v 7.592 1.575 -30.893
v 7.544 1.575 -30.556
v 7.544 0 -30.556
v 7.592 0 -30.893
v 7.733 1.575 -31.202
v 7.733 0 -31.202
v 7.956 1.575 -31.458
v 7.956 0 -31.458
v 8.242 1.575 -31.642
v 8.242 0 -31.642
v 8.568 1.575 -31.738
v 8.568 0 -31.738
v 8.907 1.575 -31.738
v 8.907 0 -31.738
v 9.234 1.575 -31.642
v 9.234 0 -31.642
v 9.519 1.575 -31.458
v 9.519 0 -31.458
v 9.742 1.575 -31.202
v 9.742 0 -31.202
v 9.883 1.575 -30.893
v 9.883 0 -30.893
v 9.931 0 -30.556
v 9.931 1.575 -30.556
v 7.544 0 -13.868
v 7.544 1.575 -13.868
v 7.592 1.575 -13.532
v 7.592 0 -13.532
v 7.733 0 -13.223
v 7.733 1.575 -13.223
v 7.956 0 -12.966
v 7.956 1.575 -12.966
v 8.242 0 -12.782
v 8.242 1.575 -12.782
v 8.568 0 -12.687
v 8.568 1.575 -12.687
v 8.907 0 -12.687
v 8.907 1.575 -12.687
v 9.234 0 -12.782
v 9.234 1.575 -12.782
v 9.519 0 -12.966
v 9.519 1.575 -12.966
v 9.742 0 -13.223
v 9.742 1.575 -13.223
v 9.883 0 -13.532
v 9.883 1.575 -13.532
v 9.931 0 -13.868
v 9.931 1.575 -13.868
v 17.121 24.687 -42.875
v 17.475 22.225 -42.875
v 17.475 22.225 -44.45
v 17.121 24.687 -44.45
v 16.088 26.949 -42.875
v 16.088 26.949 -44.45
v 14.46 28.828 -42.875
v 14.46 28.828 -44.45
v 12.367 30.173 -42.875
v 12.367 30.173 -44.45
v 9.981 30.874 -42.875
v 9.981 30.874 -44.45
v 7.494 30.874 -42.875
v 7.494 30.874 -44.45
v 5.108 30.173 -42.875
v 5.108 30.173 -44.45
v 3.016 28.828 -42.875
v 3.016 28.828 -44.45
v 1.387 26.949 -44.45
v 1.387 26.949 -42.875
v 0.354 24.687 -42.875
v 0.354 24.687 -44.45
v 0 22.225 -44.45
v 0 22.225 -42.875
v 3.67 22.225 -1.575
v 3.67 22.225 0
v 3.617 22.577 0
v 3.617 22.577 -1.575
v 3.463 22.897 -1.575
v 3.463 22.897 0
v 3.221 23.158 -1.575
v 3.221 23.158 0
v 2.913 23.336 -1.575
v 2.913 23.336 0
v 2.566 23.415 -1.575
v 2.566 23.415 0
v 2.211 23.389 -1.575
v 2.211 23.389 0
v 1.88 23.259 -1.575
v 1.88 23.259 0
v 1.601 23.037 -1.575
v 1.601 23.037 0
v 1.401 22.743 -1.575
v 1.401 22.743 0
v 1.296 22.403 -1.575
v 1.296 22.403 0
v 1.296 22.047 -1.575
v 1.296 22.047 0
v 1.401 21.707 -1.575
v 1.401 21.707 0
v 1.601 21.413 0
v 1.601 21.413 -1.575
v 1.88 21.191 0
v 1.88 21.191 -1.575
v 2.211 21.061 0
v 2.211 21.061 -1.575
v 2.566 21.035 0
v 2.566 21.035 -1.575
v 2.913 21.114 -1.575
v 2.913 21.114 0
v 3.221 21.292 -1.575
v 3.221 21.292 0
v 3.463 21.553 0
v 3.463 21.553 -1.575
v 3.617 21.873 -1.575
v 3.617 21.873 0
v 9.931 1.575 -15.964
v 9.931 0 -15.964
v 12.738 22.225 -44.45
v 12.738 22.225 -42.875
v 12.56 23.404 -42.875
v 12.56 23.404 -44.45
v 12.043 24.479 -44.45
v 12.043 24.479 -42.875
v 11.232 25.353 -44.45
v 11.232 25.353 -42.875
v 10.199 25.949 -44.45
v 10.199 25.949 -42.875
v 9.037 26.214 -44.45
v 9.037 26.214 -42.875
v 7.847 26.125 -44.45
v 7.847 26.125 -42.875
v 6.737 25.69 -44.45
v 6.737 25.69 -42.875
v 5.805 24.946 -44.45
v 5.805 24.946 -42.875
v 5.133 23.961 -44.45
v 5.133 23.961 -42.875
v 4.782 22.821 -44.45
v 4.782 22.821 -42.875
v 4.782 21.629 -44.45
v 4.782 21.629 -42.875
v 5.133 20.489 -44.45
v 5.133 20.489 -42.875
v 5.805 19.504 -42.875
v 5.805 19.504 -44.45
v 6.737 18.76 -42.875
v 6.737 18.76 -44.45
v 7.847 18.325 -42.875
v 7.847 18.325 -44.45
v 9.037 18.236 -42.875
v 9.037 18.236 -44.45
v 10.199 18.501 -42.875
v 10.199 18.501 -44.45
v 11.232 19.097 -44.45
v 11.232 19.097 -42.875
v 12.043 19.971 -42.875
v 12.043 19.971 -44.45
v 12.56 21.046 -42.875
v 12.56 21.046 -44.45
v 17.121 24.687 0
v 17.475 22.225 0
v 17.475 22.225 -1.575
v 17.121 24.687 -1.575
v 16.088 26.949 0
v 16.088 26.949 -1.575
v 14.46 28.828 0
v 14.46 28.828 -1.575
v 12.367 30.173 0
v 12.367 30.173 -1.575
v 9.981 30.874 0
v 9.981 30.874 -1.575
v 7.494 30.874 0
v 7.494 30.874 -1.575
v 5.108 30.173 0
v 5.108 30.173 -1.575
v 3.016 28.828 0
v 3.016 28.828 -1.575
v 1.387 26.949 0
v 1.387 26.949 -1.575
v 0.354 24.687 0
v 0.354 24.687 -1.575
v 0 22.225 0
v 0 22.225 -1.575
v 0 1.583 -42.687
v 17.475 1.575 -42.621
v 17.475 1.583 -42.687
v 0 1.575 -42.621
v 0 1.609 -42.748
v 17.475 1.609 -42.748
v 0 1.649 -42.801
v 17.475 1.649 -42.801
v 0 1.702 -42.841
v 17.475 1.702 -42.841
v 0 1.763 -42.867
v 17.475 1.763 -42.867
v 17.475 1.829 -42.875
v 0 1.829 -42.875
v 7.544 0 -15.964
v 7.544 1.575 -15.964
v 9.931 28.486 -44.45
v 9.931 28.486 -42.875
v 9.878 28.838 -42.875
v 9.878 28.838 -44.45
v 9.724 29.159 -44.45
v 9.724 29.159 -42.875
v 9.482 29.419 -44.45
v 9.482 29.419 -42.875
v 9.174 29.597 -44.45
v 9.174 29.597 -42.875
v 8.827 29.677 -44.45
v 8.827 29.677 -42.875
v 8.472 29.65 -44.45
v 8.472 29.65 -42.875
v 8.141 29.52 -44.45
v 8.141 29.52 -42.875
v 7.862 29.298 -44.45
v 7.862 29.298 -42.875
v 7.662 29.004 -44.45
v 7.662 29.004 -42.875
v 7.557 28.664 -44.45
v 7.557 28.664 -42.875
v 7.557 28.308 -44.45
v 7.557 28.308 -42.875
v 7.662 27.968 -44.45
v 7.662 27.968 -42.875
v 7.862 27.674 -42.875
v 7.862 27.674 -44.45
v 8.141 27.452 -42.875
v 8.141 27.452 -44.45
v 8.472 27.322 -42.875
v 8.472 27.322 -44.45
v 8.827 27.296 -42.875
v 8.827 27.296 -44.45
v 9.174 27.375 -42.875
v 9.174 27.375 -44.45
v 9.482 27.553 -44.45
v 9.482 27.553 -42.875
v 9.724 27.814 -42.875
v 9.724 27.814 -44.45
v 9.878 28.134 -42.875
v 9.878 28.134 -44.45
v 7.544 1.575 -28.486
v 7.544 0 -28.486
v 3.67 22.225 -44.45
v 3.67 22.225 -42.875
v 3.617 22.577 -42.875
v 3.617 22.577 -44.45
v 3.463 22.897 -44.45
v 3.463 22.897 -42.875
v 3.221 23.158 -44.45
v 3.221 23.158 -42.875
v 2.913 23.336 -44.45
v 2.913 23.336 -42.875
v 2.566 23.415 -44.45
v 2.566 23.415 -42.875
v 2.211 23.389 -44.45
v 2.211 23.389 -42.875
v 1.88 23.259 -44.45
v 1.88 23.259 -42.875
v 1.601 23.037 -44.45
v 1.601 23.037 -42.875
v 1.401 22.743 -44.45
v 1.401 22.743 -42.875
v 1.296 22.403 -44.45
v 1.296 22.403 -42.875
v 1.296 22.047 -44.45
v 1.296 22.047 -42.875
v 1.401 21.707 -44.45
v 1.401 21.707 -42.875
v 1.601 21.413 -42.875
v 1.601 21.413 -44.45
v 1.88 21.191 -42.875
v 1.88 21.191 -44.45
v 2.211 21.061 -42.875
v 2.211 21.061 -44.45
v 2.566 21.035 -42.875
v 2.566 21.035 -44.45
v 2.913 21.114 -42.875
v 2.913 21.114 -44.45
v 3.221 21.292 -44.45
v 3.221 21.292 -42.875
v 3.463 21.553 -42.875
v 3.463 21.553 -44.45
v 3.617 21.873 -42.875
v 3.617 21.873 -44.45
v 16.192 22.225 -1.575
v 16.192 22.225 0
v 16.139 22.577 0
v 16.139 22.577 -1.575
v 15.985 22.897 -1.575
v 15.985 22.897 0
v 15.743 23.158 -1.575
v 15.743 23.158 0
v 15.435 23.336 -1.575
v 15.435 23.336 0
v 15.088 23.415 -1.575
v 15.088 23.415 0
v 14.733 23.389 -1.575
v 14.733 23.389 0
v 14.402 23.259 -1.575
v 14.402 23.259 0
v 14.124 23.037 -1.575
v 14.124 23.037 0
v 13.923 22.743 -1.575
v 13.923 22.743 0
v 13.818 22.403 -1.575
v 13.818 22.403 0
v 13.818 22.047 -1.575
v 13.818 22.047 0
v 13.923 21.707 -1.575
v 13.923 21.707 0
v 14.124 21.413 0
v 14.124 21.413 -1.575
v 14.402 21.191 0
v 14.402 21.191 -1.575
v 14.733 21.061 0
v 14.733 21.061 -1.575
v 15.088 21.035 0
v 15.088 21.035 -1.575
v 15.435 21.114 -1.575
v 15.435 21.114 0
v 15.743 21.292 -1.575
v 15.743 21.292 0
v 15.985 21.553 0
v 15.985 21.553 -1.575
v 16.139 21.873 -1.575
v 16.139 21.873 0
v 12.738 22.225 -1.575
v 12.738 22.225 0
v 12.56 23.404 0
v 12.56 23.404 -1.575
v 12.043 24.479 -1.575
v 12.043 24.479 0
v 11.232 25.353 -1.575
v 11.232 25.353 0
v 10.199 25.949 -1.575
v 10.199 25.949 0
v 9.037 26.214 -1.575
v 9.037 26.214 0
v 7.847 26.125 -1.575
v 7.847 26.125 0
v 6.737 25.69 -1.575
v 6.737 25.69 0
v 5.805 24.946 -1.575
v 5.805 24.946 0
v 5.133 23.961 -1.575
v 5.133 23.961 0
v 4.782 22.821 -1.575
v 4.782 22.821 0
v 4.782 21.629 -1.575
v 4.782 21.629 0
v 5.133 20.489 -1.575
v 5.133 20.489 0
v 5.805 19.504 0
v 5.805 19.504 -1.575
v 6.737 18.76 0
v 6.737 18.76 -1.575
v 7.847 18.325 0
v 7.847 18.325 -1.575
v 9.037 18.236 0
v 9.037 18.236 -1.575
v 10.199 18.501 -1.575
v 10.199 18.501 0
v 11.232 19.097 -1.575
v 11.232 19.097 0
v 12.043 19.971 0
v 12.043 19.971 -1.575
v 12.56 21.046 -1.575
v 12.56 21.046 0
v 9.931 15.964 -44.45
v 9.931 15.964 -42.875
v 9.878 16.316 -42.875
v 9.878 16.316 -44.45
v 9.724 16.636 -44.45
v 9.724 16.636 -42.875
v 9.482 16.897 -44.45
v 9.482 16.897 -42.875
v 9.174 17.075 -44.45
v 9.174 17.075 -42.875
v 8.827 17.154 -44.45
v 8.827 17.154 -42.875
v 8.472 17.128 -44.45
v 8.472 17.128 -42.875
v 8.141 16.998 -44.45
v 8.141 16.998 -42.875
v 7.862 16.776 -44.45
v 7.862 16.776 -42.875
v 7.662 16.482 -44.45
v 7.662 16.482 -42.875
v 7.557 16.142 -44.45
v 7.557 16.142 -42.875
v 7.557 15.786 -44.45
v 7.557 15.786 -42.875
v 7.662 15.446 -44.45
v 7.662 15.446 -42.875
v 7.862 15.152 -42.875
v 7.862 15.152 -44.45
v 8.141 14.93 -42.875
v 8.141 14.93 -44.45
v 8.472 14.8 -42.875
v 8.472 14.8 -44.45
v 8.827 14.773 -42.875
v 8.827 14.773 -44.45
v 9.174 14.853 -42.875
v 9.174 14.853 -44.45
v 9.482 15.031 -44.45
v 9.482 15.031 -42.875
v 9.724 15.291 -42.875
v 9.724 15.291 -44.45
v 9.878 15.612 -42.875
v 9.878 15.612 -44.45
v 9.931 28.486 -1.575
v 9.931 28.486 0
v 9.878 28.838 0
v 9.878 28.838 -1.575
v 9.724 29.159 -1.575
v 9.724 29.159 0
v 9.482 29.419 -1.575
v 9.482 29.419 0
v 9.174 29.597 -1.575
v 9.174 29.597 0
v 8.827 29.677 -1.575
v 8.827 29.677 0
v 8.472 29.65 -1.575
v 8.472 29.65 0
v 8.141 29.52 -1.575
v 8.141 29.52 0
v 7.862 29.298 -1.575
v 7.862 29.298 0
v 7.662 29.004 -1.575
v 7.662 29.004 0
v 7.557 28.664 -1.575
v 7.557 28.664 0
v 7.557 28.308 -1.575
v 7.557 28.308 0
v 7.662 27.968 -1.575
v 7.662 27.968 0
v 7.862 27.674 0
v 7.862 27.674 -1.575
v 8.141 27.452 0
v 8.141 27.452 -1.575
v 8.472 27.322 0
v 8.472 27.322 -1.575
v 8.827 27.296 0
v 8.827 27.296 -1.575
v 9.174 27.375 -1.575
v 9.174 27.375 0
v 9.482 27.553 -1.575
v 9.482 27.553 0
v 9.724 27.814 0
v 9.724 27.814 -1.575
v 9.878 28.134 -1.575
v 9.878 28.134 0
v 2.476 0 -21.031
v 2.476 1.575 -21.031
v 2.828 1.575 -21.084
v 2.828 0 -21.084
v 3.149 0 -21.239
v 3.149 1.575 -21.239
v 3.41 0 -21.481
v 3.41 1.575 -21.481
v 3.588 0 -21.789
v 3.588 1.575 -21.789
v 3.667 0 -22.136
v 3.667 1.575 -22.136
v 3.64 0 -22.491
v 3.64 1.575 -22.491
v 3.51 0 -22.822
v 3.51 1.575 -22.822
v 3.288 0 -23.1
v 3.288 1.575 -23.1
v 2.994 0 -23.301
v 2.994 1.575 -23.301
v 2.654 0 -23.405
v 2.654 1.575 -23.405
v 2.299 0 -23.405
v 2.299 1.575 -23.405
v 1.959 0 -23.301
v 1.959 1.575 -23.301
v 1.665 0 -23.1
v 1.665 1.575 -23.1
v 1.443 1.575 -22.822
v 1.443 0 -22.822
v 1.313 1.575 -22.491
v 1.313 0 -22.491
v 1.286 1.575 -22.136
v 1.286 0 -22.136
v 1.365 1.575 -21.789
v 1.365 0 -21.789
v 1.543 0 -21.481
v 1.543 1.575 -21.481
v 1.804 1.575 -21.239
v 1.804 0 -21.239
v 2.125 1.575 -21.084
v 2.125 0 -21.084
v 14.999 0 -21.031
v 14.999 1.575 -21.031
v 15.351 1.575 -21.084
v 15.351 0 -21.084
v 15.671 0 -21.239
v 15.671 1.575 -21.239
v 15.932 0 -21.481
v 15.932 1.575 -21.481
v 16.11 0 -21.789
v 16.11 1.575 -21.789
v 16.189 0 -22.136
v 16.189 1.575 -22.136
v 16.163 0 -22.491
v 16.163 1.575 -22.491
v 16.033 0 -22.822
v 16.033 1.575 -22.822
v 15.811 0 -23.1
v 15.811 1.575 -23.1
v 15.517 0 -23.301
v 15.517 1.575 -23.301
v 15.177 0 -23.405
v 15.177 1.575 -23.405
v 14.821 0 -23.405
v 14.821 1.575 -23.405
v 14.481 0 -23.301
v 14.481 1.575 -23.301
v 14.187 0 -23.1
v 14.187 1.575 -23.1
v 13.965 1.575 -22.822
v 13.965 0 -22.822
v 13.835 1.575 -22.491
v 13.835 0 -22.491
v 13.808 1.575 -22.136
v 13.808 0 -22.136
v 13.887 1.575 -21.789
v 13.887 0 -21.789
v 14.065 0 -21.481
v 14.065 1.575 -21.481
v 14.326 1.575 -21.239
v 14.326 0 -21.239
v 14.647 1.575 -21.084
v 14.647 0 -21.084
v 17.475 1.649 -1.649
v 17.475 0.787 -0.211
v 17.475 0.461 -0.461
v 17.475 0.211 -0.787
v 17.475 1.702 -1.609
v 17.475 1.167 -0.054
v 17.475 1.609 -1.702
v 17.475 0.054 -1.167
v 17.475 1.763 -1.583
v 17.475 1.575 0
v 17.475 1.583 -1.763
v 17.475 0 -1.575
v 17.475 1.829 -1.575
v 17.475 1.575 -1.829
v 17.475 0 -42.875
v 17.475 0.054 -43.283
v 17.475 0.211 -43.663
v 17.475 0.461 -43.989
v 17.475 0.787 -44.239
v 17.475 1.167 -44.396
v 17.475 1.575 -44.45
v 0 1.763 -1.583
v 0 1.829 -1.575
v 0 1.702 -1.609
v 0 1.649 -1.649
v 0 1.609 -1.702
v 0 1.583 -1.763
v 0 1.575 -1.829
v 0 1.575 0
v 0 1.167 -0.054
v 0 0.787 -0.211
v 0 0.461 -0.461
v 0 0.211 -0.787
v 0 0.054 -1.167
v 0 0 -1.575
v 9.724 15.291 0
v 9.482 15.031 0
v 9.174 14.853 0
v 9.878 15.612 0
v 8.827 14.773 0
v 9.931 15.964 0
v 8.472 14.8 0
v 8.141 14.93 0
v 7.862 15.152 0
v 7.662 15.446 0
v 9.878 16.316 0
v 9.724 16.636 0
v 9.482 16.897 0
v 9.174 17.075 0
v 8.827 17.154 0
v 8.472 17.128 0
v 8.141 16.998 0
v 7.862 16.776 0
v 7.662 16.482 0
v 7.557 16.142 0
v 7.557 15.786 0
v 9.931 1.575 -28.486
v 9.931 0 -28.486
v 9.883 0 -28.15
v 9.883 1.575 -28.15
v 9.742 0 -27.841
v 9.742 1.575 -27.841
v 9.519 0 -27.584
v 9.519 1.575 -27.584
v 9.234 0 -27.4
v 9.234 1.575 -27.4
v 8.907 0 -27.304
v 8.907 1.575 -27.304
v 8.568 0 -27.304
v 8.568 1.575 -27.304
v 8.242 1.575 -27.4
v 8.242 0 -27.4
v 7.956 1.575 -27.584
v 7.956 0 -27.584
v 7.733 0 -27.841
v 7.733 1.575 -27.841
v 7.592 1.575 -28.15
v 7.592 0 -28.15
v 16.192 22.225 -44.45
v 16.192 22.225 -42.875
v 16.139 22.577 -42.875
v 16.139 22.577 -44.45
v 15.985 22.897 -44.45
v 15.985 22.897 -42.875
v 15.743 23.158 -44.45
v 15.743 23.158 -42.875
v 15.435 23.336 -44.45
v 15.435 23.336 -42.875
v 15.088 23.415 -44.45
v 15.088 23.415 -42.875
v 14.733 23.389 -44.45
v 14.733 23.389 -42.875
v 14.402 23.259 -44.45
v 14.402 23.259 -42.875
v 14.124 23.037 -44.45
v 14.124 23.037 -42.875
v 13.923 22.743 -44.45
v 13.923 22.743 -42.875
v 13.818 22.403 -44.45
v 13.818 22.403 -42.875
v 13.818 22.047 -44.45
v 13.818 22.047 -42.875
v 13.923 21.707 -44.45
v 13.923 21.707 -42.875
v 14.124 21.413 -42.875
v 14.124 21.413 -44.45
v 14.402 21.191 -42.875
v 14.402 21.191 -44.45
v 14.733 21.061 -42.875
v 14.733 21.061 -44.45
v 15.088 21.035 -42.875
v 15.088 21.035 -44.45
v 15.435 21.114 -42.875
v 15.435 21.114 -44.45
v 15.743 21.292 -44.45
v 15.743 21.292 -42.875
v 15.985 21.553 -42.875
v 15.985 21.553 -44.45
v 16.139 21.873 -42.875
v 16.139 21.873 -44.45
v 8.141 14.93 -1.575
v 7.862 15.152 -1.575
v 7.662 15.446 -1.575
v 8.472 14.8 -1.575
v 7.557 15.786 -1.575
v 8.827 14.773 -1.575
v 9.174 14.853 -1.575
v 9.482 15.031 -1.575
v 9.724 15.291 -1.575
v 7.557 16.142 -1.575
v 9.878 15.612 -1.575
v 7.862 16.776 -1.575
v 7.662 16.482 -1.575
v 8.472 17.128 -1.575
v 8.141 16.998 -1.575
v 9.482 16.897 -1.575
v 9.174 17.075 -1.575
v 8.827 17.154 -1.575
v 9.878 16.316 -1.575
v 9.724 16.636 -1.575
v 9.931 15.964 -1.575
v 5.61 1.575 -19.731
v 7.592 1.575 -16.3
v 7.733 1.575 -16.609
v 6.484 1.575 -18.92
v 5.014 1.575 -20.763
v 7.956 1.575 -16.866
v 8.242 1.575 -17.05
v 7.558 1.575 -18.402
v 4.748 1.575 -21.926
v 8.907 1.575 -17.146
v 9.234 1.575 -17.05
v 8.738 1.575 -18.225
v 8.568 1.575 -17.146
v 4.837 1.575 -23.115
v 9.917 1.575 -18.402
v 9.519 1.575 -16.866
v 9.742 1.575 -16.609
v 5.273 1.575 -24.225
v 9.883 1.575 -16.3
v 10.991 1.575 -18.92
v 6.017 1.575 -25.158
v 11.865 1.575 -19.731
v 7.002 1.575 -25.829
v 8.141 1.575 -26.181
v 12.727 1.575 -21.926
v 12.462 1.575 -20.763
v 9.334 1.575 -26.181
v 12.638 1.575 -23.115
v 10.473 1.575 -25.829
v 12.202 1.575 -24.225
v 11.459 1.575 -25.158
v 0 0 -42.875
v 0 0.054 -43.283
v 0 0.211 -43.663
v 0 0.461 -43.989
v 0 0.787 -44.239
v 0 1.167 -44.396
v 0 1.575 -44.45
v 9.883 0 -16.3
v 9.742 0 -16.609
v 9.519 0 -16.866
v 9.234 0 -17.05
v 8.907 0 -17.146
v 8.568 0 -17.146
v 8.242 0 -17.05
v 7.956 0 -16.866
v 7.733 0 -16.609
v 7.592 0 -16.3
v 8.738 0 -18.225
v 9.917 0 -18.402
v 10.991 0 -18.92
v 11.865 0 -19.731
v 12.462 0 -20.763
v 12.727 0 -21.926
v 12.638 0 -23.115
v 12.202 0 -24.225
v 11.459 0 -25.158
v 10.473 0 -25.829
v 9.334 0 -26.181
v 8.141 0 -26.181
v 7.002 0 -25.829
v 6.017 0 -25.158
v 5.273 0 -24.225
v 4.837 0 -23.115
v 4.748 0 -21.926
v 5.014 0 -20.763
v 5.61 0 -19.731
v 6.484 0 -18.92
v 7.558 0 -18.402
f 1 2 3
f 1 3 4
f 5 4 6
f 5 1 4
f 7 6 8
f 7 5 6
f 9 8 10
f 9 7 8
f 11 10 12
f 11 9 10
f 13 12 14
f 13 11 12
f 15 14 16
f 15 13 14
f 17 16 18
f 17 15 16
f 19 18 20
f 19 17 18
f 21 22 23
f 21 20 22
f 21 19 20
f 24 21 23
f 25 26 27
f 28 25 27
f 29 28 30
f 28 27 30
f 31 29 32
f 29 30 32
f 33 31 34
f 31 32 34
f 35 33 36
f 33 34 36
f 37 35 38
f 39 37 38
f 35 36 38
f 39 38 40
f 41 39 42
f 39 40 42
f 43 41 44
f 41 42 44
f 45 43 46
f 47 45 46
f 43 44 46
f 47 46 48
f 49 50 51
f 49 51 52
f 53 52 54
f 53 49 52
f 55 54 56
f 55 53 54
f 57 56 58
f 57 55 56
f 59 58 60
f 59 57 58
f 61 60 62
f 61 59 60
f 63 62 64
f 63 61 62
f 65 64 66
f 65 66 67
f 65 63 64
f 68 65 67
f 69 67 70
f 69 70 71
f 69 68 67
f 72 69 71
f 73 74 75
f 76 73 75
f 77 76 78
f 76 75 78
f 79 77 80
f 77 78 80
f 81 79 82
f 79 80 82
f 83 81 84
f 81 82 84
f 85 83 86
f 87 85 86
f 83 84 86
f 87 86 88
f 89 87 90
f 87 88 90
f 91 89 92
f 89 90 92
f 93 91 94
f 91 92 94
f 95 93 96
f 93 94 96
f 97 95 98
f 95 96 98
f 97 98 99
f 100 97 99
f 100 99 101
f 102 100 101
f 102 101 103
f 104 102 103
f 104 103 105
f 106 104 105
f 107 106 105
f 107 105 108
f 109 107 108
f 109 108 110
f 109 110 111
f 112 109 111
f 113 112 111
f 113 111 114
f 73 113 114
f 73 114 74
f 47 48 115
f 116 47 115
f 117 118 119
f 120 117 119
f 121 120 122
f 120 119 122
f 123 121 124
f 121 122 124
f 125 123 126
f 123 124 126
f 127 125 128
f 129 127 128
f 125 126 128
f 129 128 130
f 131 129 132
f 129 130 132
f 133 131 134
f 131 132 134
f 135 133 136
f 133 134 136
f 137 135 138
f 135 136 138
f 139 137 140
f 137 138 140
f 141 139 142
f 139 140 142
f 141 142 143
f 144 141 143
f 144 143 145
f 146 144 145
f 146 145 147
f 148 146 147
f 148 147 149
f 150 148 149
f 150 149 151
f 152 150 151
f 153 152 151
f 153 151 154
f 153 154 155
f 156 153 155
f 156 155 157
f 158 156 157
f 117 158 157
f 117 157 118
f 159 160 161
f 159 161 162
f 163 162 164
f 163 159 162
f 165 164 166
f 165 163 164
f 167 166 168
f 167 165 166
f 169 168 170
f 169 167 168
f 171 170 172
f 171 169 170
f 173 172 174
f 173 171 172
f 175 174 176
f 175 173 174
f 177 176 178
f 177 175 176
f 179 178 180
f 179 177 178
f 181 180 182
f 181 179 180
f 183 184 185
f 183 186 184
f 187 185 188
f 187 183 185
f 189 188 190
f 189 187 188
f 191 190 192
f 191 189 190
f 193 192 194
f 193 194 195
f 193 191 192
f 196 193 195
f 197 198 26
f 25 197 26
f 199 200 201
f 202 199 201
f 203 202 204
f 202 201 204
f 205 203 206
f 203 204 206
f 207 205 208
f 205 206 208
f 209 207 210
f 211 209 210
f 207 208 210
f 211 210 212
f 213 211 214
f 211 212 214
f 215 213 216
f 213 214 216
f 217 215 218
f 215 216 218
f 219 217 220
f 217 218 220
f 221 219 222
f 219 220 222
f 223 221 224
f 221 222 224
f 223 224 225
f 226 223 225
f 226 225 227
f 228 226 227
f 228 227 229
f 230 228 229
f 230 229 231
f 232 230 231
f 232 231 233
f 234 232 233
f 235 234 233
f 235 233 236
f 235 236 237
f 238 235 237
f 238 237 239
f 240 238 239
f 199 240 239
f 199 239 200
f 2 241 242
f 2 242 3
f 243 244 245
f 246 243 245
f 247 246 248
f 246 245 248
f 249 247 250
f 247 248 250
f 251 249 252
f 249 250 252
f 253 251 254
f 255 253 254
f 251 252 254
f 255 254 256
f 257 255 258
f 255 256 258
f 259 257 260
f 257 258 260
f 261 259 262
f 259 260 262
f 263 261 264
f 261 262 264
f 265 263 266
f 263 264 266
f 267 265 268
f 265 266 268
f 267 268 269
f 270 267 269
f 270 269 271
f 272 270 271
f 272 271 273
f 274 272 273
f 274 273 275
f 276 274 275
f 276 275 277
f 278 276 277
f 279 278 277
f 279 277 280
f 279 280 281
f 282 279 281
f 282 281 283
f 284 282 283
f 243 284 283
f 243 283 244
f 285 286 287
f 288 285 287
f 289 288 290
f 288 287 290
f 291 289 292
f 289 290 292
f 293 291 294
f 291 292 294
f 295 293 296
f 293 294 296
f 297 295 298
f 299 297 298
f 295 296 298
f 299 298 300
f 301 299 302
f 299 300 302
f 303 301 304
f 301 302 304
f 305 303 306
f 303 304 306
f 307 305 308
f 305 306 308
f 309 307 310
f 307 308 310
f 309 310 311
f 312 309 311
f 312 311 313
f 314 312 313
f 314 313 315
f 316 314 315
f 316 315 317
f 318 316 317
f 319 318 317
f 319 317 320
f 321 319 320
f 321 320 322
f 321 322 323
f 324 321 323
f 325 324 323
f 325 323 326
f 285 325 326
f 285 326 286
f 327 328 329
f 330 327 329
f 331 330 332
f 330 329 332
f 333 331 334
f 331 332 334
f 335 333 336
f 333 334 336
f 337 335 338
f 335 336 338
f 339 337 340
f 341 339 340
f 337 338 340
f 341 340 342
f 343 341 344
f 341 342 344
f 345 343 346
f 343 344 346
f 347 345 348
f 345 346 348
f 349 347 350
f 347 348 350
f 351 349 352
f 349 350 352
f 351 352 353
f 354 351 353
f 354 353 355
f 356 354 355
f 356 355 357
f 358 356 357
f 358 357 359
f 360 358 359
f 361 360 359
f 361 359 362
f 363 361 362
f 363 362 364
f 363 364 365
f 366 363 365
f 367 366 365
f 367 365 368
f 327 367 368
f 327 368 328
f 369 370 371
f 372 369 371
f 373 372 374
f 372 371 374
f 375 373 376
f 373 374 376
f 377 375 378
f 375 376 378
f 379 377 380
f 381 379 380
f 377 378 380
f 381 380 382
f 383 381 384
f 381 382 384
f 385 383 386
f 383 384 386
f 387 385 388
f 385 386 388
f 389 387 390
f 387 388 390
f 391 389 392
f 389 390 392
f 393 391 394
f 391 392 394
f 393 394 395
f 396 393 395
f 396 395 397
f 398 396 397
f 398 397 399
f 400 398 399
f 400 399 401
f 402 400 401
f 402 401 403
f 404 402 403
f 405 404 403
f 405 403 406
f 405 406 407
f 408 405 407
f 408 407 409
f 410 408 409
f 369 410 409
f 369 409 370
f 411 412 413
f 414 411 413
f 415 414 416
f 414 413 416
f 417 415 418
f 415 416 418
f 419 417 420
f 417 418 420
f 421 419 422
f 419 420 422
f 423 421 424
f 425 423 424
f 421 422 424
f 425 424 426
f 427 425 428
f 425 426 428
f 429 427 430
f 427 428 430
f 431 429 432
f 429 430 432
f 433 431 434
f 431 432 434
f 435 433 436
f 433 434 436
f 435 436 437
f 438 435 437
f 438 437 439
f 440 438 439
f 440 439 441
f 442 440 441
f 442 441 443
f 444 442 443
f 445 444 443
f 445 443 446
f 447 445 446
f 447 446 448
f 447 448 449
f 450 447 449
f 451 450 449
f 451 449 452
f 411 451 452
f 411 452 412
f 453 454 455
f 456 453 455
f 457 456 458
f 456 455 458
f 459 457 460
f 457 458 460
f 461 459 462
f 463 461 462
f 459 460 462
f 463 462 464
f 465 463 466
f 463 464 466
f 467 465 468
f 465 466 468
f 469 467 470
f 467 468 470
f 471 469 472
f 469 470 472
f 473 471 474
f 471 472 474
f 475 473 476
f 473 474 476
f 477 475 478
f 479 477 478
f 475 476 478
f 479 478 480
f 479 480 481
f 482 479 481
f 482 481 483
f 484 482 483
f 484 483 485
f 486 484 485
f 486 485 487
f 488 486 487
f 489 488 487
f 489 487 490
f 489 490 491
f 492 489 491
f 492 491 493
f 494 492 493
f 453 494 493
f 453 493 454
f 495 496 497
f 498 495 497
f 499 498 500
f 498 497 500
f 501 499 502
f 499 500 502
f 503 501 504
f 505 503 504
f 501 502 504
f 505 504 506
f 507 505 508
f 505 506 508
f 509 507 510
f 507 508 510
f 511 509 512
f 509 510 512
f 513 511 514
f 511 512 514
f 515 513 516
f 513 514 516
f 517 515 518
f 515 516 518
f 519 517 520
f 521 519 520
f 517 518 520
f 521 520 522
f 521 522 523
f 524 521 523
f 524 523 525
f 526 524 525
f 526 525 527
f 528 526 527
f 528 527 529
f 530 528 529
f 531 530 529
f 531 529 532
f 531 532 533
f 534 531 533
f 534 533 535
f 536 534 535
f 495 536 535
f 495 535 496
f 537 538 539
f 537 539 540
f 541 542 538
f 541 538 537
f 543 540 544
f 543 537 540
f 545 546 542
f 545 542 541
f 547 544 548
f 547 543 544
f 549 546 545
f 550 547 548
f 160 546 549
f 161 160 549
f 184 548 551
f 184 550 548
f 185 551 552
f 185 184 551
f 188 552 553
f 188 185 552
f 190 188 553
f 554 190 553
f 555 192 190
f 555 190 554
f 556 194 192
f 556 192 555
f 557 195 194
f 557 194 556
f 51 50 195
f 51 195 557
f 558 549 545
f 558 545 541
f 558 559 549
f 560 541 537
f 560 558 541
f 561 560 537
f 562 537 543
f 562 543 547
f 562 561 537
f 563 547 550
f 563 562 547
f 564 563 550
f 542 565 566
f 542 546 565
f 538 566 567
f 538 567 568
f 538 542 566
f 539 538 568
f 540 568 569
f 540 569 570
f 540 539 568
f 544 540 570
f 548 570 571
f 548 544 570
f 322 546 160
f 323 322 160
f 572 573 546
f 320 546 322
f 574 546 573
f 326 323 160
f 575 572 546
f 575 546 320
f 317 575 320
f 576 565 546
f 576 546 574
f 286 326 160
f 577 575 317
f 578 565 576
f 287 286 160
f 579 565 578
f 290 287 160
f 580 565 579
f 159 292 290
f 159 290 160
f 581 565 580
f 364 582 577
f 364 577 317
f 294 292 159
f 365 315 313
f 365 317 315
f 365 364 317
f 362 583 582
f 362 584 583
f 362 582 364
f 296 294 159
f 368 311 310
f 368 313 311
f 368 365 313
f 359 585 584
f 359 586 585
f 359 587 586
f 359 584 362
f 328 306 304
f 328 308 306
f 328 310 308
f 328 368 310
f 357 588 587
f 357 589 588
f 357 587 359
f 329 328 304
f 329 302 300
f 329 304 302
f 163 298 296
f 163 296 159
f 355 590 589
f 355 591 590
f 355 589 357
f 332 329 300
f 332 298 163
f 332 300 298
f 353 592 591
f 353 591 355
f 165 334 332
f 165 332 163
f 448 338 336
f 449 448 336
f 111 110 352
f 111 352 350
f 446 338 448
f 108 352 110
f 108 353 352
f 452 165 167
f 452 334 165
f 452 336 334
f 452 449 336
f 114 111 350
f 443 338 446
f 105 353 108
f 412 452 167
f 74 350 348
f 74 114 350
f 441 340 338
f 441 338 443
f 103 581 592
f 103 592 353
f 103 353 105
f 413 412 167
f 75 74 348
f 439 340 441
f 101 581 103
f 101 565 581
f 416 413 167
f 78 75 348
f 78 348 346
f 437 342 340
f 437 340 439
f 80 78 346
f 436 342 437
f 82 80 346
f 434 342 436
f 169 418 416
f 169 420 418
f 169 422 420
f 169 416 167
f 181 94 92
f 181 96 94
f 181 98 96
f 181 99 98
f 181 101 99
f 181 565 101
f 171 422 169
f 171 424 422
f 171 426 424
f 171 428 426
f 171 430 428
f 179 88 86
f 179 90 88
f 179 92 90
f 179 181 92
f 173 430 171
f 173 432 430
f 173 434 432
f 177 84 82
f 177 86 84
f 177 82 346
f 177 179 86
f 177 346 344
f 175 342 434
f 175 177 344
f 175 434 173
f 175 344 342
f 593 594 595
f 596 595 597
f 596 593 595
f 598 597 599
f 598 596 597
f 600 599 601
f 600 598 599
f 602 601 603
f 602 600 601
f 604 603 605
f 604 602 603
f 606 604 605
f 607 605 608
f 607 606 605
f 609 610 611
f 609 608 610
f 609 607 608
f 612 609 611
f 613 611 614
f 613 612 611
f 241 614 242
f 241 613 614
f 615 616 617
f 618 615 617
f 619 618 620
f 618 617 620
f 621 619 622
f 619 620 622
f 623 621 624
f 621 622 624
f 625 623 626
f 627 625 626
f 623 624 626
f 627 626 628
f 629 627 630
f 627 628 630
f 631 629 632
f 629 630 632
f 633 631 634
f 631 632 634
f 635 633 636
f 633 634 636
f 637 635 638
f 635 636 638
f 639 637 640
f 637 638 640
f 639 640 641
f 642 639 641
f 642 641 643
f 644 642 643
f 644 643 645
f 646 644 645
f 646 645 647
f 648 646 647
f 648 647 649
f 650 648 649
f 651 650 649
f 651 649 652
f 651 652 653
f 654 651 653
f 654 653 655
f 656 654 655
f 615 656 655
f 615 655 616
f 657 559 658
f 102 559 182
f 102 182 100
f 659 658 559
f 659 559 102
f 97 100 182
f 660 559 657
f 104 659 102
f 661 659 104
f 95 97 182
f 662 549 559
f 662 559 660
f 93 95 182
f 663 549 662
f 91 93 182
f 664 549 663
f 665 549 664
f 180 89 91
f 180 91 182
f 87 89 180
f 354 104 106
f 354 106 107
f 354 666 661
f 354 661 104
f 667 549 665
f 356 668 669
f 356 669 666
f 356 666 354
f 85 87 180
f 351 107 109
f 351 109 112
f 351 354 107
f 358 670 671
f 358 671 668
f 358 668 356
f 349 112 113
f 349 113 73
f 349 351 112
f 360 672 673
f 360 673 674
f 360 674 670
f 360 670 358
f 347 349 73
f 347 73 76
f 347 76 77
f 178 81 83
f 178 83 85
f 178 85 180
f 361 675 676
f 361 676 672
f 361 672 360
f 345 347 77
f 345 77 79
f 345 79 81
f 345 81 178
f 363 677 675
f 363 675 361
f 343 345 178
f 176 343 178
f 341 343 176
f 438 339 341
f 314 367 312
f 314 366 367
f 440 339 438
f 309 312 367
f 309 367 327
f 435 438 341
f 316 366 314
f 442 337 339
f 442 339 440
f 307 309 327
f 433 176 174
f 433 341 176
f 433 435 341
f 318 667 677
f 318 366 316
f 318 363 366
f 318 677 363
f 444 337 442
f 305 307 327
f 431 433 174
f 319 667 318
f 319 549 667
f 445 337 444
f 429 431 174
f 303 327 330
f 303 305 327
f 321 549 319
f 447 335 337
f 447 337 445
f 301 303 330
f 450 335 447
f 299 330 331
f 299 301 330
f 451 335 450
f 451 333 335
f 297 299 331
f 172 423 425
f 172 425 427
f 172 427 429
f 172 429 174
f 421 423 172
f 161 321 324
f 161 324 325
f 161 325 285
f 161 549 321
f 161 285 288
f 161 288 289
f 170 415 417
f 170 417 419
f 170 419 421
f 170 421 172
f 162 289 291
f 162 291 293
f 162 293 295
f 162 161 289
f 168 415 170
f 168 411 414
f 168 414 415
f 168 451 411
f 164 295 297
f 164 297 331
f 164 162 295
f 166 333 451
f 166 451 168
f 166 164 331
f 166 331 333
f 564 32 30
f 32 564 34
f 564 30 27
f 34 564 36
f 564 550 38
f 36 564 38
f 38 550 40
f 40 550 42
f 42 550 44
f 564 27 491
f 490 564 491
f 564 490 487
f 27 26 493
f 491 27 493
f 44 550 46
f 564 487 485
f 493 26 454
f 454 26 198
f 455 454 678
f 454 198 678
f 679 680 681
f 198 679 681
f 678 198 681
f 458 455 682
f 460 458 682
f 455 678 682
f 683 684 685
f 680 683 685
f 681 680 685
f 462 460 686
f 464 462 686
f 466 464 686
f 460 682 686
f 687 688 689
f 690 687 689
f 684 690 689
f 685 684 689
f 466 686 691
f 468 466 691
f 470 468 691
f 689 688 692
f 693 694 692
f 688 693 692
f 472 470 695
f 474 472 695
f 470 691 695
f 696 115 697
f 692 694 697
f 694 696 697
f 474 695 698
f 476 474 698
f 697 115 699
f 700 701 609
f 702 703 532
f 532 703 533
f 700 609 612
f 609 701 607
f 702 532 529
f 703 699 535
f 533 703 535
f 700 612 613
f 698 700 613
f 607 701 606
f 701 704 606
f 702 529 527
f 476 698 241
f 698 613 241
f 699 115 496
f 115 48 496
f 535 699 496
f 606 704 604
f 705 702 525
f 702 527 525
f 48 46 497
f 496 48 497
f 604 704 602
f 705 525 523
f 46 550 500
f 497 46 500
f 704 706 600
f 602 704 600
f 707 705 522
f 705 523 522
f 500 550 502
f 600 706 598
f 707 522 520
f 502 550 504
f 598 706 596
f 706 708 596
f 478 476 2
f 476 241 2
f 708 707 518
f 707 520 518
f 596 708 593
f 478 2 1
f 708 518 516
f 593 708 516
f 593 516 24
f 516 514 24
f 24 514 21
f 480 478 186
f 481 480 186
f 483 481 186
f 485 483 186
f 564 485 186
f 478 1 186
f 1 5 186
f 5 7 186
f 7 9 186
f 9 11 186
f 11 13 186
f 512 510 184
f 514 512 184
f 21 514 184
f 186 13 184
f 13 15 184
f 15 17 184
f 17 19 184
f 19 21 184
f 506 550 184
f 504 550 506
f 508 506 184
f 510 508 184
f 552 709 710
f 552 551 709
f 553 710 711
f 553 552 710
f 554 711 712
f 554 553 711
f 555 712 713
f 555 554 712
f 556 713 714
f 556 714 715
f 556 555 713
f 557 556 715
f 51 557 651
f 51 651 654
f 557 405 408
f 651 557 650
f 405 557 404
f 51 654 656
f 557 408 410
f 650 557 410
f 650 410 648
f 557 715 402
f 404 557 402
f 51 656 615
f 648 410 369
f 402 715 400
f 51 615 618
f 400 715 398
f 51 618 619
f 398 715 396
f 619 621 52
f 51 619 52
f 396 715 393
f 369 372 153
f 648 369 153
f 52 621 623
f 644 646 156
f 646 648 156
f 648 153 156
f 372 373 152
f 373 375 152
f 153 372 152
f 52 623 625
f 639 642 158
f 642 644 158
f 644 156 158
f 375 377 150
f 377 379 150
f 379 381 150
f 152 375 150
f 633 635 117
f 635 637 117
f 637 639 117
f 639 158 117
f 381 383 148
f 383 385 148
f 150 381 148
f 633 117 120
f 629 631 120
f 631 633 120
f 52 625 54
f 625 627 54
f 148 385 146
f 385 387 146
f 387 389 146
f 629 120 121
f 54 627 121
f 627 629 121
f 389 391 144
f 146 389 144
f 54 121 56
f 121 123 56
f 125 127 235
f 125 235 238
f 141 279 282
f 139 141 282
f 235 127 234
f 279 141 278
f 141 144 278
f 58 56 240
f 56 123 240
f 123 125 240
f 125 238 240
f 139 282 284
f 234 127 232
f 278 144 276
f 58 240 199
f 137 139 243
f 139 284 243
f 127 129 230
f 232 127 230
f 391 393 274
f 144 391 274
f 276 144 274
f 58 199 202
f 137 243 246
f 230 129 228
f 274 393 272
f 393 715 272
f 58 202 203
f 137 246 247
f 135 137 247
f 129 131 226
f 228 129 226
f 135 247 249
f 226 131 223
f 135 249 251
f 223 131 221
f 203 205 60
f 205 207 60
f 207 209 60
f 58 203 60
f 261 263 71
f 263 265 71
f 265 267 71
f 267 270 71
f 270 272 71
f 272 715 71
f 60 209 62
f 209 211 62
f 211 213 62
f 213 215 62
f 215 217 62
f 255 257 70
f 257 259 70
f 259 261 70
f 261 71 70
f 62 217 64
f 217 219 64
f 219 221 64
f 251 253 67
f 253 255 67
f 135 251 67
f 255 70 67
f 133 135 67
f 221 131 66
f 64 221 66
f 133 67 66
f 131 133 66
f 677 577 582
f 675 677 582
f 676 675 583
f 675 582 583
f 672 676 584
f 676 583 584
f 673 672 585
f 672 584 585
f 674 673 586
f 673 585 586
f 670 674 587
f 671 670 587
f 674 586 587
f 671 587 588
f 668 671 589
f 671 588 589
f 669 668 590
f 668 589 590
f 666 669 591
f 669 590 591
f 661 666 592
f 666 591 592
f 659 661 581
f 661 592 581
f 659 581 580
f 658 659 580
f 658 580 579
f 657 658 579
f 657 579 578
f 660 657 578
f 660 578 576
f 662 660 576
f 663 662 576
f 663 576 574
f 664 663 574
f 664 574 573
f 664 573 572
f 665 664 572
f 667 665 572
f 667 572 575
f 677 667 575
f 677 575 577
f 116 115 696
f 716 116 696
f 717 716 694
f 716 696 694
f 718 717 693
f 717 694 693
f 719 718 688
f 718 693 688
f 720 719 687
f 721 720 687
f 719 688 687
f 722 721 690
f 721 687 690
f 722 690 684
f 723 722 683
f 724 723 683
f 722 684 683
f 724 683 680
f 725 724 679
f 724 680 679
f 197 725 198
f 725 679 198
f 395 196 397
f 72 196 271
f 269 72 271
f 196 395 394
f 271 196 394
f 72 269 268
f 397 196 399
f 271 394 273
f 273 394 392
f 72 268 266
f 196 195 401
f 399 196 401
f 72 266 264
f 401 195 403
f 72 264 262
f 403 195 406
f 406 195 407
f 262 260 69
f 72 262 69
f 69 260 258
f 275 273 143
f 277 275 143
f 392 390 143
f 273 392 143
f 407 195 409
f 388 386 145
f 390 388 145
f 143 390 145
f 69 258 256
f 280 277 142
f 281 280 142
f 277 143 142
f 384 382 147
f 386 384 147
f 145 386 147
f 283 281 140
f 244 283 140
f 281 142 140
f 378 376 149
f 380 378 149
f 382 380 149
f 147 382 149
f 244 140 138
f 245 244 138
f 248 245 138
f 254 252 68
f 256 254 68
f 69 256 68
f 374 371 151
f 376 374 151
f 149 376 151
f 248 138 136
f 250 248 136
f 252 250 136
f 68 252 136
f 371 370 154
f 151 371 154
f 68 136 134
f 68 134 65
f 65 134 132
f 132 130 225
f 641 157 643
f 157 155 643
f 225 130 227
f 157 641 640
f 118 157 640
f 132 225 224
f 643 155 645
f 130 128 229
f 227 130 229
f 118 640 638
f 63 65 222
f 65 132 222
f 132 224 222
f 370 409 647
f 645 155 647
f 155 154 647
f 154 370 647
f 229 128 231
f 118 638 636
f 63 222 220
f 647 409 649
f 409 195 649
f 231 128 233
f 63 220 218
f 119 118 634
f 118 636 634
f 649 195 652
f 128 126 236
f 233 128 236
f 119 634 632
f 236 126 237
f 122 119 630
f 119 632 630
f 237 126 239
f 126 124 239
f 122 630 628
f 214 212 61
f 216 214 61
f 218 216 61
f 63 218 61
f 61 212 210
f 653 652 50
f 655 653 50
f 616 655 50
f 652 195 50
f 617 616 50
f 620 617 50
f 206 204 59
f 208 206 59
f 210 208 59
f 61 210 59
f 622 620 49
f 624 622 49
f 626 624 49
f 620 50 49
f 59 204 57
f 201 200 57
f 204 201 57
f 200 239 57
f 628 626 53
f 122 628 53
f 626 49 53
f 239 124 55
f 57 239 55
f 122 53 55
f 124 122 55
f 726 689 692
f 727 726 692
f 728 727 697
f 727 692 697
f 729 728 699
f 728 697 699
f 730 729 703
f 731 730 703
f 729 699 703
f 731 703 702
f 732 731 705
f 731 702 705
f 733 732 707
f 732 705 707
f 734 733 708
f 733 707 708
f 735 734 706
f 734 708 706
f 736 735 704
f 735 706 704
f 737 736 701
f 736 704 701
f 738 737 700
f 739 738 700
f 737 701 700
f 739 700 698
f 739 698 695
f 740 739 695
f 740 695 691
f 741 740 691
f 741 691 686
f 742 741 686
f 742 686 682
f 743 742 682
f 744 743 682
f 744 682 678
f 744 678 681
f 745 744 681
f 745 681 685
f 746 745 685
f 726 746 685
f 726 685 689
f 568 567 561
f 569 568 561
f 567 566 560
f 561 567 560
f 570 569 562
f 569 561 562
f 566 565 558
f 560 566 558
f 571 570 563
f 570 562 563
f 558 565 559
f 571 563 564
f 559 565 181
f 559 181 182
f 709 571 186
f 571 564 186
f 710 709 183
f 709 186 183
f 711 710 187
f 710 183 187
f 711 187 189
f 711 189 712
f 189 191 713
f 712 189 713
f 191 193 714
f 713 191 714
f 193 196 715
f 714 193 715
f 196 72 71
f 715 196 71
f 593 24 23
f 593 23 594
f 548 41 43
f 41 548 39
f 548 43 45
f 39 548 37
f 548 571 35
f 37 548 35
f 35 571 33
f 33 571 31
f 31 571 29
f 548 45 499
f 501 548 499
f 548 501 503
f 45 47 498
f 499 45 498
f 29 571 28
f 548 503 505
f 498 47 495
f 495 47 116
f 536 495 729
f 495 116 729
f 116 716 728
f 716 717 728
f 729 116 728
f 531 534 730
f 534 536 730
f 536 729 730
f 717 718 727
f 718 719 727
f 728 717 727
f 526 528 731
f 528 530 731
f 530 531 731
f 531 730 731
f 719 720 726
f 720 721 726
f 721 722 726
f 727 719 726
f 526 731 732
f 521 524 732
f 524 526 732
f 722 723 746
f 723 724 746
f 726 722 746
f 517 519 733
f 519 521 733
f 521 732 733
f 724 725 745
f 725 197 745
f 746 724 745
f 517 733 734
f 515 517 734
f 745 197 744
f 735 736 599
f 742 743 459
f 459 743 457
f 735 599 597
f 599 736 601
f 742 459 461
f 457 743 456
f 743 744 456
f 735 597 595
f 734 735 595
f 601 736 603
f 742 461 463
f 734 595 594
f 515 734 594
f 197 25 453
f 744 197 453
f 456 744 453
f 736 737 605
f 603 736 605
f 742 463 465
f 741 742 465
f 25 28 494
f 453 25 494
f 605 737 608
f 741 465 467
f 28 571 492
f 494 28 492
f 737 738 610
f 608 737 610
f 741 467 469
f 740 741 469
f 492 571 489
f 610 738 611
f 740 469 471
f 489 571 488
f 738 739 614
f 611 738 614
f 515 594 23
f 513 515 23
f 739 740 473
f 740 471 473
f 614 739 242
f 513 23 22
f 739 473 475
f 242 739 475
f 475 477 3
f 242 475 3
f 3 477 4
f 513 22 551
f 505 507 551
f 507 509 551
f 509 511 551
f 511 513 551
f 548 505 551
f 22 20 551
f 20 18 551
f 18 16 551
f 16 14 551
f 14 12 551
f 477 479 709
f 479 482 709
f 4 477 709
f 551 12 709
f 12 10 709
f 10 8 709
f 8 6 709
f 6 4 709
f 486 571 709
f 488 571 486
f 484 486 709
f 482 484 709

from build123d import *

# Parameters (mm, degrees)
SKETCH1_W         = 44.45
SKETCH1_H         = 30.9626
EXTRUDE1_DEPTH    = 17.4752
SKETCH2_W         = 41.3004
SKETCH2_H         = 29.3878
EXTRUDE2_DEPTH    = 17.4752
SKETCH3_OUTSIDE_W = 30.859
SKETCH3_OUTSIDE_H = 44.347
EXTRUDE3_DEPTH    = 45.45
SKETCH4_R         = 4.0005
SKETCH4_R_2       = 1.1938
EXTRUDE4_DEPTH    = 45.45
SKETCH5_R         = 4.0005
SKETCH5_R_2       = 1.1938
EXTRUDE5_DEPTH    = 17.4752
FILLET1_R         = 1.5748
FILLET2_R         = 0.254


with BuildPart() as part:
    # Sketch1 → Extrude1 (new body)
    with BuildSketch(Plane(origin=(0, 0, 0), x_dir=(0, 0, -1), z_dir=(1, 0, 0))):
        with Locations((22.225, 15.4813)):
            Rectangle(SKETCH1_W, SKETCH1_H)
    extrude(amount=EXTRUDE1_DEPTH)

    # Sketch2 → Extrude2 (cut)
    with BuildSketch(Plane(origin=(17.4752, 0, 0), x_dir=(0, 0, -1), z_dir=(1, 0, 0))):
        with Locations((22.225, 16.2687)):
            Rectangle(SKETCH2_W, SKETCH2_H)
    extrude(amount=-EXTRUDE2_DEPTH, mode=Mode.SUBTRACT)

    # Sketch3 outside → Extrude3 (cut, through all)
    with BuildSketch(Plane.XY):
        with Locations((8.7375, 15.4815)):
            Rectangle(SKETCH3_OUTSIDE_W, SKETCH3_OUTSIDE_H)
        with BuildLine():
            Line((0, 22.225), (0, 0))
            Line((0, 0), (17.4752, 0))
            Line((17.4752, 0), (17.4752, 22.225))
            ThreePointArc((17.4752, 22.225), (8.7376, 30.9626), (0, 22.225))
        make_face(mode=Mode.SUBTRACT)
    extrude(amount=-EXTRUDE3_DEPTH, mode=Mode.SUBTRACT)

    # Sketch4 → Extrude4 (cut, through all)
    with BuildSketch(Plane.XY):
        with Locations((8.7376, 22.225)):
            Circle(SKETCH4_R)
        with Locations((2.4765, 22.225)):
            Circle(SKETCH4_R_2)
        with Locations((14.9987, 22.225)):
            Circle(SKETCH4_R_2)
        with Locations((8.7376, 15.9639)):
            Circle(SKETCH4_R_2)
        with Locations((8.7376, 28.4861)):
            Circle(SKETCH4_R_2)
    extrude(amount=-EXTRUDE4_DEPTH, mode=Mode.SUBTRACT)

    # Sketch5 → Extrude5 (cut)
    with BuildSketch(Plane(origin=(0, 1.5748, 0), x_dir=(1, 0, 0), z_dir=(0, 1, 0))):
        with Locations(Location((8.7376, 22.225, 0), (0, 0, 270))):  # turned: the seam where the file's is
            Circle(SKETCH5_R)
        with Locations(Location((2.4765, 22.225, 0), (0, 0, 270))):  # turned: the seam where the file's is
            Circle(SKETCH5_R_2)
        with Locations(Location((14.9987, 22.225, 0), (0, 0, 270))):  # turned: the seam where the file's is
            Circle(SKETCH5_R_2)
        with BuildLine():
            Line((9.9314, 30.5562), (9.9314, 28.4861))
            ThreePointArc((9.9314, 28.4861), (8.7376, 27.2923), (7.5438, 28.4861))
            Line((7.5438, 28.4861), (7.5438, 30.5562))
            ThreePointArc((7.5438, 30.5562), (8.7376, 31.75), (9.9314, 30.5562))
        make_face()
        with BuildLine():
            Line((7.5438, 15.9639), (7.5438, 13.8684))
            ThreePointArc((7.5438, 13.8684), (8.7376, 12.6746), (9.9314, 13.8684))
            Line((9.9314, 13.8684), (9.9314, 15.9639))
            ThreePointArc((9.9314, 15.9639), (8.7376, 17.1577), (7.5438, 15.9639))
        make_face()
    extrude(amount=-EXTRUDE5_DEPTH, mode=Mode.SUBTRACT)

    # Fillet1
    fillet1_edges = [part.edges().sort_by_distance(p)[0] for p in [
        (8.7376, 0, -44.45),
        (8.7376, 0, 0),
    ]]
    fillet(fillet1_edges, radius=FILLET1_R)

    # Fillet2
    fillet2_edges = [part.edges().sort_by_distance(p)[0] for p in [
        (8.7376, 1.5748, -42.8752),
        (8.7376, 1.5748, -1.5748),
    ]]
    fillet(fillet2_edges, radius=FILLET2_R)


solid = part.part
